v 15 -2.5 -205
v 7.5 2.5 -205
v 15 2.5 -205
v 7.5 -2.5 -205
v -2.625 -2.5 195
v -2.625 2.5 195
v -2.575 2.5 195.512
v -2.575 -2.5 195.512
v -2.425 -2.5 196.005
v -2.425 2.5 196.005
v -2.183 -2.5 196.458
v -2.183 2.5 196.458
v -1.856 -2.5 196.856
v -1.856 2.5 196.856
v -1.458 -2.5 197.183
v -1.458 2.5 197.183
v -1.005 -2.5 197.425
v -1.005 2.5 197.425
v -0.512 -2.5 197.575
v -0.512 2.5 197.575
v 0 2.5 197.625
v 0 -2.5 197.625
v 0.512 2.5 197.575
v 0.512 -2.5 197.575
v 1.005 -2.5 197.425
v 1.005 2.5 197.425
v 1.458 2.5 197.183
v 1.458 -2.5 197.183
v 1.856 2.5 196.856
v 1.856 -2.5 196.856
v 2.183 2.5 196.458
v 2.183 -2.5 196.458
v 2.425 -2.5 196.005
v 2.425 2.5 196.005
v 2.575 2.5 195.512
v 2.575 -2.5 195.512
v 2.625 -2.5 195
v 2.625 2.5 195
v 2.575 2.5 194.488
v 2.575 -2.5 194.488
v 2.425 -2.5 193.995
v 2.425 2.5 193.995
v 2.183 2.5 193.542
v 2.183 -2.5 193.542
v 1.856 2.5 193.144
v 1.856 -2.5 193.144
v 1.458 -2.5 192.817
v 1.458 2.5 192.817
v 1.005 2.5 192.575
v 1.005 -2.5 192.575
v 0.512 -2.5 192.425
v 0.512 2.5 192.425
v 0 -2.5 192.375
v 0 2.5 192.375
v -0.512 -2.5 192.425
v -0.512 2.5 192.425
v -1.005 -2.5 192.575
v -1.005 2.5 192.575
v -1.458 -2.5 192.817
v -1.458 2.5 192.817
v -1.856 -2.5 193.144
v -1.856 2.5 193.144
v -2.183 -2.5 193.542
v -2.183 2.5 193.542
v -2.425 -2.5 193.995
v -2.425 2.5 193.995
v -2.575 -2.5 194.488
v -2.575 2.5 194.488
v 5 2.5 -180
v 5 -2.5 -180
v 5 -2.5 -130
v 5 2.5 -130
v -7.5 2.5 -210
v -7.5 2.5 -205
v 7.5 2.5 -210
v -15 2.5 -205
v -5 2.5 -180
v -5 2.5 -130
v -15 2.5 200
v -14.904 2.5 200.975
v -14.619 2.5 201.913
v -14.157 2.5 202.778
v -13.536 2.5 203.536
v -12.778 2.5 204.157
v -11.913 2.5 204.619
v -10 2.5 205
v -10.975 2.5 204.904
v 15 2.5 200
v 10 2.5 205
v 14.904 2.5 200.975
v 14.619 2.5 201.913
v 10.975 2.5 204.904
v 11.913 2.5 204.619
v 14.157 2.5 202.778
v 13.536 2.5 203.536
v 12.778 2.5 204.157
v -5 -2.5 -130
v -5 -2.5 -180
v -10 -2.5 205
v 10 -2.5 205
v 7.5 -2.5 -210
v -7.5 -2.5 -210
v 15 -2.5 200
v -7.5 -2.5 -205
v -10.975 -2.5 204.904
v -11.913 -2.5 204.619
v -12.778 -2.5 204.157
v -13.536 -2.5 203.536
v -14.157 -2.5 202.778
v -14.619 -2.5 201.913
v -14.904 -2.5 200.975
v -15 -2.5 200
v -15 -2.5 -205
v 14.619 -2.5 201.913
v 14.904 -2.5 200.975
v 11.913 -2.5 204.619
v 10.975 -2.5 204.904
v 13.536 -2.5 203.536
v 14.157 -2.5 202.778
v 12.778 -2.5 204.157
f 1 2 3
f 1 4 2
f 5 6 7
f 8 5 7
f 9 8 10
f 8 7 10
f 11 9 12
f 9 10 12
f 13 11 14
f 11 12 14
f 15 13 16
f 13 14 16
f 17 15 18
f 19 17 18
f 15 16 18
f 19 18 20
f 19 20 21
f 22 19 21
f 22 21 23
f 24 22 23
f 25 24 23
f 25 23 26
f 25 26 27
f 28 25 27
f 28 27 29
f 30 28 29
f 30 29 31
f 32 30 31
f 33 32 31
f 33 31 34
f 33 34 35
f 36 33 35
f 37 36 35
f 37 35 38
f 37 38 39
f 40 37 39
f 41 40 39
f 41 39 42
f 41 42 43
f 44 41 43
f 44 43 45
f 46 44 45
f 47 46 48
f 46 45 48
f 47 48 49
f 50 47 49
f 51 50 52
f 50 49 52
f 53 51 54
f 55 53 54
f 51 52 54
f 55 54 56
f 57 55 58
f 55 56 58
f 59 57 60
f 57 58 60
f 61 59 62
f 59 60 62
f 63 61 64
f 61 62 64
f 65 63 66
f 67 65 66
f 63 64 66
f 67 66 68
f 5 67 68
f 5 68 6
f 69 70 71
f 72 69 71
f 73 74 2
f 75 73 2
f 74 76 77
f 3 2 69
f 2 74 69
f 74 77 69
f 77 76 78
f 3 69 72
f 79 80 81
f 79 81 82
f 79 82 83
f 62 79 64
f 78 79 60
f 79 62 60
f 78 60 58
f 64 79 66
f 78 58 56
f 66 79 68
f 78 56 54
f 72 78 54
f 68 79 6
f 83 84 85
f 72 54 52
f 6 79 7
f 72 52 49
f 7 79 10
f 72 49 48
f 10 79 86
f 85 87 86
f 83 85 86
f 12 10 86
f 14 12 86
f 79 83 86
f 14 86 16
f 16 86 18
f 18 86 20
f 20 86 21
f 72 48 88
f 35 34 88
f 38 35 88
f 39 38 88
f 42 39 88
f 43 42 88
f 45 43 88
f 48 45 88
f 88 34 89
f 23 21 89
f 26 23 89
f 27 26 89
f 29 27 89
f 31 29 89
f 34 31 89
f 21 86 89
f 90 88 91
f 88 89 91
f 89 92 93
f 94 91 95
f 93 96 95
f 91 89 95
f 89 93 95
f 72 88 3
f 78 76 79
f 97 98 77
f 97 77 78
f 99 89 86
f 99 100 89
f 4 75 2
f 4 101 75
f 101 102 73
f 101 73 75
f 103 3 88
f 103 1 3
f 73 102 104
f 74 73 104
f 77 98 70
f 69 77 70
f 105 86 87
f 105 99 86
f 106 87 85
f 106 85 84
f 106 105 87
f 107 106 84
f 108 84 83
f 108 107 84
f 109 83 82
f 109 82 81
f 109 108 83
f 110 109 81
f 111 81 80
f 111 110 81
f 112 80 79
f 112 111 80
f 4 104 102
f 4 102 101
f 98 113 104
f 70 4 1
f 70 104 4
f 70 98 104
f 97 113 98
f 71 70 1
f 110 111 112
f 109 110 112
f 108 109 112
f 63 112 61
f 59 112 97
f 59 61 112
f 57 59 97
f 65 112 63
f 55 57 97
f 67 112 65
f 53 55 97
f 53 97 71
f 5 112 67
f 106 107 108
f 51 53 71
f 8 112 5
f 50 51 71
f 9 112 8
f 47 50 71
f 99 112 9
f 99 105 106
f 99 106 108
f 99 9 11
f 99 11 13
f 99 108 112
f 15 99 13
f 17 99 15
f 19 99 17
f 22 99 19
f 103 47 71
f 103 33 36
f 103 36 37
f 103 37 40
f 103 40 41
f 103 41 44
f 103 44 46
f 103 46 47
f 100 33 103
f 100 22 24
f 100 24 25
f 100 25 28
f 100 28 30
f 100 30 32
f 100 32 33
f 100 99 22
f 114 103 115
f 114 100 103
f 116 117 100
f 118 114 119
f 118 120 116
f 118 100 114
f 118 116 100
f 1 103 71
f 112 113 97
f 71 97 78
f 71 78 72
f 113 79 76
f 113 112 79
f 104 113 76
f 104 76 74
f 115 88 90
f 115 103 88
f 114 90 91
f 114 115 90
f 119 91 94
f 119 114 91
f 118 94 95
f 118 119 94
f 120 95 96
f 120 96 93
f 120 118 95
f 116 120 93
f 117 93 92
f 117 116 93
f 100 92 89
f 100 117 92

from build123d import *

# Parameters (mm, degrees)
F0_W     = 15
F0_H     = 5
F1_DEPTH = 2.5
F3_D     = 5.25
F4_R     = 5
F5_W     = 10
F5_H     = 50
F6_DEPTH = 10


with BuildPart() as f1:
    # F0 (on Front) → F1 (new body, symmetric)
    with BuildSketch(Plane.XZ):
        Polygon((15, -205), (15, 205), (-15, 205), (-15, -205), (-7.5, -205), (-7.5, -200), (7.5, -200), (7.5, -205), align=None)
        with Locations((0, -207.5)):
            Rectangle(F0_W, F0_H)
        with Locations((0, -202.5)):
            Rectangle(F0_W, F0_H)
    extrude(amount=F1_DEPTH, both=True)

    # F3 (through all)
    with Locations(Plane.XZ.offset(2.5)):
        with Locations((0, 195)):
            Hole(F3_D / 2)

    # F4
    f4_edges = [f1.edges().sort_by_distance(p)[0] for p in [
        (15, 0, 205),
        (-15, 0, 205),
    ]]
    fillet(f4_edges, radius=F4_R)

    # F5 (on face) → F6 (cut)
    with BuildSketch(Plane.XZ.offset(2.5)):
        with Locations((0, -155)):
            Rectangle(F5_W, F5_H)
    extrude(amount=-F6_DEPTH, mode=Mode.SUBTRACT)


solid = f1.part
